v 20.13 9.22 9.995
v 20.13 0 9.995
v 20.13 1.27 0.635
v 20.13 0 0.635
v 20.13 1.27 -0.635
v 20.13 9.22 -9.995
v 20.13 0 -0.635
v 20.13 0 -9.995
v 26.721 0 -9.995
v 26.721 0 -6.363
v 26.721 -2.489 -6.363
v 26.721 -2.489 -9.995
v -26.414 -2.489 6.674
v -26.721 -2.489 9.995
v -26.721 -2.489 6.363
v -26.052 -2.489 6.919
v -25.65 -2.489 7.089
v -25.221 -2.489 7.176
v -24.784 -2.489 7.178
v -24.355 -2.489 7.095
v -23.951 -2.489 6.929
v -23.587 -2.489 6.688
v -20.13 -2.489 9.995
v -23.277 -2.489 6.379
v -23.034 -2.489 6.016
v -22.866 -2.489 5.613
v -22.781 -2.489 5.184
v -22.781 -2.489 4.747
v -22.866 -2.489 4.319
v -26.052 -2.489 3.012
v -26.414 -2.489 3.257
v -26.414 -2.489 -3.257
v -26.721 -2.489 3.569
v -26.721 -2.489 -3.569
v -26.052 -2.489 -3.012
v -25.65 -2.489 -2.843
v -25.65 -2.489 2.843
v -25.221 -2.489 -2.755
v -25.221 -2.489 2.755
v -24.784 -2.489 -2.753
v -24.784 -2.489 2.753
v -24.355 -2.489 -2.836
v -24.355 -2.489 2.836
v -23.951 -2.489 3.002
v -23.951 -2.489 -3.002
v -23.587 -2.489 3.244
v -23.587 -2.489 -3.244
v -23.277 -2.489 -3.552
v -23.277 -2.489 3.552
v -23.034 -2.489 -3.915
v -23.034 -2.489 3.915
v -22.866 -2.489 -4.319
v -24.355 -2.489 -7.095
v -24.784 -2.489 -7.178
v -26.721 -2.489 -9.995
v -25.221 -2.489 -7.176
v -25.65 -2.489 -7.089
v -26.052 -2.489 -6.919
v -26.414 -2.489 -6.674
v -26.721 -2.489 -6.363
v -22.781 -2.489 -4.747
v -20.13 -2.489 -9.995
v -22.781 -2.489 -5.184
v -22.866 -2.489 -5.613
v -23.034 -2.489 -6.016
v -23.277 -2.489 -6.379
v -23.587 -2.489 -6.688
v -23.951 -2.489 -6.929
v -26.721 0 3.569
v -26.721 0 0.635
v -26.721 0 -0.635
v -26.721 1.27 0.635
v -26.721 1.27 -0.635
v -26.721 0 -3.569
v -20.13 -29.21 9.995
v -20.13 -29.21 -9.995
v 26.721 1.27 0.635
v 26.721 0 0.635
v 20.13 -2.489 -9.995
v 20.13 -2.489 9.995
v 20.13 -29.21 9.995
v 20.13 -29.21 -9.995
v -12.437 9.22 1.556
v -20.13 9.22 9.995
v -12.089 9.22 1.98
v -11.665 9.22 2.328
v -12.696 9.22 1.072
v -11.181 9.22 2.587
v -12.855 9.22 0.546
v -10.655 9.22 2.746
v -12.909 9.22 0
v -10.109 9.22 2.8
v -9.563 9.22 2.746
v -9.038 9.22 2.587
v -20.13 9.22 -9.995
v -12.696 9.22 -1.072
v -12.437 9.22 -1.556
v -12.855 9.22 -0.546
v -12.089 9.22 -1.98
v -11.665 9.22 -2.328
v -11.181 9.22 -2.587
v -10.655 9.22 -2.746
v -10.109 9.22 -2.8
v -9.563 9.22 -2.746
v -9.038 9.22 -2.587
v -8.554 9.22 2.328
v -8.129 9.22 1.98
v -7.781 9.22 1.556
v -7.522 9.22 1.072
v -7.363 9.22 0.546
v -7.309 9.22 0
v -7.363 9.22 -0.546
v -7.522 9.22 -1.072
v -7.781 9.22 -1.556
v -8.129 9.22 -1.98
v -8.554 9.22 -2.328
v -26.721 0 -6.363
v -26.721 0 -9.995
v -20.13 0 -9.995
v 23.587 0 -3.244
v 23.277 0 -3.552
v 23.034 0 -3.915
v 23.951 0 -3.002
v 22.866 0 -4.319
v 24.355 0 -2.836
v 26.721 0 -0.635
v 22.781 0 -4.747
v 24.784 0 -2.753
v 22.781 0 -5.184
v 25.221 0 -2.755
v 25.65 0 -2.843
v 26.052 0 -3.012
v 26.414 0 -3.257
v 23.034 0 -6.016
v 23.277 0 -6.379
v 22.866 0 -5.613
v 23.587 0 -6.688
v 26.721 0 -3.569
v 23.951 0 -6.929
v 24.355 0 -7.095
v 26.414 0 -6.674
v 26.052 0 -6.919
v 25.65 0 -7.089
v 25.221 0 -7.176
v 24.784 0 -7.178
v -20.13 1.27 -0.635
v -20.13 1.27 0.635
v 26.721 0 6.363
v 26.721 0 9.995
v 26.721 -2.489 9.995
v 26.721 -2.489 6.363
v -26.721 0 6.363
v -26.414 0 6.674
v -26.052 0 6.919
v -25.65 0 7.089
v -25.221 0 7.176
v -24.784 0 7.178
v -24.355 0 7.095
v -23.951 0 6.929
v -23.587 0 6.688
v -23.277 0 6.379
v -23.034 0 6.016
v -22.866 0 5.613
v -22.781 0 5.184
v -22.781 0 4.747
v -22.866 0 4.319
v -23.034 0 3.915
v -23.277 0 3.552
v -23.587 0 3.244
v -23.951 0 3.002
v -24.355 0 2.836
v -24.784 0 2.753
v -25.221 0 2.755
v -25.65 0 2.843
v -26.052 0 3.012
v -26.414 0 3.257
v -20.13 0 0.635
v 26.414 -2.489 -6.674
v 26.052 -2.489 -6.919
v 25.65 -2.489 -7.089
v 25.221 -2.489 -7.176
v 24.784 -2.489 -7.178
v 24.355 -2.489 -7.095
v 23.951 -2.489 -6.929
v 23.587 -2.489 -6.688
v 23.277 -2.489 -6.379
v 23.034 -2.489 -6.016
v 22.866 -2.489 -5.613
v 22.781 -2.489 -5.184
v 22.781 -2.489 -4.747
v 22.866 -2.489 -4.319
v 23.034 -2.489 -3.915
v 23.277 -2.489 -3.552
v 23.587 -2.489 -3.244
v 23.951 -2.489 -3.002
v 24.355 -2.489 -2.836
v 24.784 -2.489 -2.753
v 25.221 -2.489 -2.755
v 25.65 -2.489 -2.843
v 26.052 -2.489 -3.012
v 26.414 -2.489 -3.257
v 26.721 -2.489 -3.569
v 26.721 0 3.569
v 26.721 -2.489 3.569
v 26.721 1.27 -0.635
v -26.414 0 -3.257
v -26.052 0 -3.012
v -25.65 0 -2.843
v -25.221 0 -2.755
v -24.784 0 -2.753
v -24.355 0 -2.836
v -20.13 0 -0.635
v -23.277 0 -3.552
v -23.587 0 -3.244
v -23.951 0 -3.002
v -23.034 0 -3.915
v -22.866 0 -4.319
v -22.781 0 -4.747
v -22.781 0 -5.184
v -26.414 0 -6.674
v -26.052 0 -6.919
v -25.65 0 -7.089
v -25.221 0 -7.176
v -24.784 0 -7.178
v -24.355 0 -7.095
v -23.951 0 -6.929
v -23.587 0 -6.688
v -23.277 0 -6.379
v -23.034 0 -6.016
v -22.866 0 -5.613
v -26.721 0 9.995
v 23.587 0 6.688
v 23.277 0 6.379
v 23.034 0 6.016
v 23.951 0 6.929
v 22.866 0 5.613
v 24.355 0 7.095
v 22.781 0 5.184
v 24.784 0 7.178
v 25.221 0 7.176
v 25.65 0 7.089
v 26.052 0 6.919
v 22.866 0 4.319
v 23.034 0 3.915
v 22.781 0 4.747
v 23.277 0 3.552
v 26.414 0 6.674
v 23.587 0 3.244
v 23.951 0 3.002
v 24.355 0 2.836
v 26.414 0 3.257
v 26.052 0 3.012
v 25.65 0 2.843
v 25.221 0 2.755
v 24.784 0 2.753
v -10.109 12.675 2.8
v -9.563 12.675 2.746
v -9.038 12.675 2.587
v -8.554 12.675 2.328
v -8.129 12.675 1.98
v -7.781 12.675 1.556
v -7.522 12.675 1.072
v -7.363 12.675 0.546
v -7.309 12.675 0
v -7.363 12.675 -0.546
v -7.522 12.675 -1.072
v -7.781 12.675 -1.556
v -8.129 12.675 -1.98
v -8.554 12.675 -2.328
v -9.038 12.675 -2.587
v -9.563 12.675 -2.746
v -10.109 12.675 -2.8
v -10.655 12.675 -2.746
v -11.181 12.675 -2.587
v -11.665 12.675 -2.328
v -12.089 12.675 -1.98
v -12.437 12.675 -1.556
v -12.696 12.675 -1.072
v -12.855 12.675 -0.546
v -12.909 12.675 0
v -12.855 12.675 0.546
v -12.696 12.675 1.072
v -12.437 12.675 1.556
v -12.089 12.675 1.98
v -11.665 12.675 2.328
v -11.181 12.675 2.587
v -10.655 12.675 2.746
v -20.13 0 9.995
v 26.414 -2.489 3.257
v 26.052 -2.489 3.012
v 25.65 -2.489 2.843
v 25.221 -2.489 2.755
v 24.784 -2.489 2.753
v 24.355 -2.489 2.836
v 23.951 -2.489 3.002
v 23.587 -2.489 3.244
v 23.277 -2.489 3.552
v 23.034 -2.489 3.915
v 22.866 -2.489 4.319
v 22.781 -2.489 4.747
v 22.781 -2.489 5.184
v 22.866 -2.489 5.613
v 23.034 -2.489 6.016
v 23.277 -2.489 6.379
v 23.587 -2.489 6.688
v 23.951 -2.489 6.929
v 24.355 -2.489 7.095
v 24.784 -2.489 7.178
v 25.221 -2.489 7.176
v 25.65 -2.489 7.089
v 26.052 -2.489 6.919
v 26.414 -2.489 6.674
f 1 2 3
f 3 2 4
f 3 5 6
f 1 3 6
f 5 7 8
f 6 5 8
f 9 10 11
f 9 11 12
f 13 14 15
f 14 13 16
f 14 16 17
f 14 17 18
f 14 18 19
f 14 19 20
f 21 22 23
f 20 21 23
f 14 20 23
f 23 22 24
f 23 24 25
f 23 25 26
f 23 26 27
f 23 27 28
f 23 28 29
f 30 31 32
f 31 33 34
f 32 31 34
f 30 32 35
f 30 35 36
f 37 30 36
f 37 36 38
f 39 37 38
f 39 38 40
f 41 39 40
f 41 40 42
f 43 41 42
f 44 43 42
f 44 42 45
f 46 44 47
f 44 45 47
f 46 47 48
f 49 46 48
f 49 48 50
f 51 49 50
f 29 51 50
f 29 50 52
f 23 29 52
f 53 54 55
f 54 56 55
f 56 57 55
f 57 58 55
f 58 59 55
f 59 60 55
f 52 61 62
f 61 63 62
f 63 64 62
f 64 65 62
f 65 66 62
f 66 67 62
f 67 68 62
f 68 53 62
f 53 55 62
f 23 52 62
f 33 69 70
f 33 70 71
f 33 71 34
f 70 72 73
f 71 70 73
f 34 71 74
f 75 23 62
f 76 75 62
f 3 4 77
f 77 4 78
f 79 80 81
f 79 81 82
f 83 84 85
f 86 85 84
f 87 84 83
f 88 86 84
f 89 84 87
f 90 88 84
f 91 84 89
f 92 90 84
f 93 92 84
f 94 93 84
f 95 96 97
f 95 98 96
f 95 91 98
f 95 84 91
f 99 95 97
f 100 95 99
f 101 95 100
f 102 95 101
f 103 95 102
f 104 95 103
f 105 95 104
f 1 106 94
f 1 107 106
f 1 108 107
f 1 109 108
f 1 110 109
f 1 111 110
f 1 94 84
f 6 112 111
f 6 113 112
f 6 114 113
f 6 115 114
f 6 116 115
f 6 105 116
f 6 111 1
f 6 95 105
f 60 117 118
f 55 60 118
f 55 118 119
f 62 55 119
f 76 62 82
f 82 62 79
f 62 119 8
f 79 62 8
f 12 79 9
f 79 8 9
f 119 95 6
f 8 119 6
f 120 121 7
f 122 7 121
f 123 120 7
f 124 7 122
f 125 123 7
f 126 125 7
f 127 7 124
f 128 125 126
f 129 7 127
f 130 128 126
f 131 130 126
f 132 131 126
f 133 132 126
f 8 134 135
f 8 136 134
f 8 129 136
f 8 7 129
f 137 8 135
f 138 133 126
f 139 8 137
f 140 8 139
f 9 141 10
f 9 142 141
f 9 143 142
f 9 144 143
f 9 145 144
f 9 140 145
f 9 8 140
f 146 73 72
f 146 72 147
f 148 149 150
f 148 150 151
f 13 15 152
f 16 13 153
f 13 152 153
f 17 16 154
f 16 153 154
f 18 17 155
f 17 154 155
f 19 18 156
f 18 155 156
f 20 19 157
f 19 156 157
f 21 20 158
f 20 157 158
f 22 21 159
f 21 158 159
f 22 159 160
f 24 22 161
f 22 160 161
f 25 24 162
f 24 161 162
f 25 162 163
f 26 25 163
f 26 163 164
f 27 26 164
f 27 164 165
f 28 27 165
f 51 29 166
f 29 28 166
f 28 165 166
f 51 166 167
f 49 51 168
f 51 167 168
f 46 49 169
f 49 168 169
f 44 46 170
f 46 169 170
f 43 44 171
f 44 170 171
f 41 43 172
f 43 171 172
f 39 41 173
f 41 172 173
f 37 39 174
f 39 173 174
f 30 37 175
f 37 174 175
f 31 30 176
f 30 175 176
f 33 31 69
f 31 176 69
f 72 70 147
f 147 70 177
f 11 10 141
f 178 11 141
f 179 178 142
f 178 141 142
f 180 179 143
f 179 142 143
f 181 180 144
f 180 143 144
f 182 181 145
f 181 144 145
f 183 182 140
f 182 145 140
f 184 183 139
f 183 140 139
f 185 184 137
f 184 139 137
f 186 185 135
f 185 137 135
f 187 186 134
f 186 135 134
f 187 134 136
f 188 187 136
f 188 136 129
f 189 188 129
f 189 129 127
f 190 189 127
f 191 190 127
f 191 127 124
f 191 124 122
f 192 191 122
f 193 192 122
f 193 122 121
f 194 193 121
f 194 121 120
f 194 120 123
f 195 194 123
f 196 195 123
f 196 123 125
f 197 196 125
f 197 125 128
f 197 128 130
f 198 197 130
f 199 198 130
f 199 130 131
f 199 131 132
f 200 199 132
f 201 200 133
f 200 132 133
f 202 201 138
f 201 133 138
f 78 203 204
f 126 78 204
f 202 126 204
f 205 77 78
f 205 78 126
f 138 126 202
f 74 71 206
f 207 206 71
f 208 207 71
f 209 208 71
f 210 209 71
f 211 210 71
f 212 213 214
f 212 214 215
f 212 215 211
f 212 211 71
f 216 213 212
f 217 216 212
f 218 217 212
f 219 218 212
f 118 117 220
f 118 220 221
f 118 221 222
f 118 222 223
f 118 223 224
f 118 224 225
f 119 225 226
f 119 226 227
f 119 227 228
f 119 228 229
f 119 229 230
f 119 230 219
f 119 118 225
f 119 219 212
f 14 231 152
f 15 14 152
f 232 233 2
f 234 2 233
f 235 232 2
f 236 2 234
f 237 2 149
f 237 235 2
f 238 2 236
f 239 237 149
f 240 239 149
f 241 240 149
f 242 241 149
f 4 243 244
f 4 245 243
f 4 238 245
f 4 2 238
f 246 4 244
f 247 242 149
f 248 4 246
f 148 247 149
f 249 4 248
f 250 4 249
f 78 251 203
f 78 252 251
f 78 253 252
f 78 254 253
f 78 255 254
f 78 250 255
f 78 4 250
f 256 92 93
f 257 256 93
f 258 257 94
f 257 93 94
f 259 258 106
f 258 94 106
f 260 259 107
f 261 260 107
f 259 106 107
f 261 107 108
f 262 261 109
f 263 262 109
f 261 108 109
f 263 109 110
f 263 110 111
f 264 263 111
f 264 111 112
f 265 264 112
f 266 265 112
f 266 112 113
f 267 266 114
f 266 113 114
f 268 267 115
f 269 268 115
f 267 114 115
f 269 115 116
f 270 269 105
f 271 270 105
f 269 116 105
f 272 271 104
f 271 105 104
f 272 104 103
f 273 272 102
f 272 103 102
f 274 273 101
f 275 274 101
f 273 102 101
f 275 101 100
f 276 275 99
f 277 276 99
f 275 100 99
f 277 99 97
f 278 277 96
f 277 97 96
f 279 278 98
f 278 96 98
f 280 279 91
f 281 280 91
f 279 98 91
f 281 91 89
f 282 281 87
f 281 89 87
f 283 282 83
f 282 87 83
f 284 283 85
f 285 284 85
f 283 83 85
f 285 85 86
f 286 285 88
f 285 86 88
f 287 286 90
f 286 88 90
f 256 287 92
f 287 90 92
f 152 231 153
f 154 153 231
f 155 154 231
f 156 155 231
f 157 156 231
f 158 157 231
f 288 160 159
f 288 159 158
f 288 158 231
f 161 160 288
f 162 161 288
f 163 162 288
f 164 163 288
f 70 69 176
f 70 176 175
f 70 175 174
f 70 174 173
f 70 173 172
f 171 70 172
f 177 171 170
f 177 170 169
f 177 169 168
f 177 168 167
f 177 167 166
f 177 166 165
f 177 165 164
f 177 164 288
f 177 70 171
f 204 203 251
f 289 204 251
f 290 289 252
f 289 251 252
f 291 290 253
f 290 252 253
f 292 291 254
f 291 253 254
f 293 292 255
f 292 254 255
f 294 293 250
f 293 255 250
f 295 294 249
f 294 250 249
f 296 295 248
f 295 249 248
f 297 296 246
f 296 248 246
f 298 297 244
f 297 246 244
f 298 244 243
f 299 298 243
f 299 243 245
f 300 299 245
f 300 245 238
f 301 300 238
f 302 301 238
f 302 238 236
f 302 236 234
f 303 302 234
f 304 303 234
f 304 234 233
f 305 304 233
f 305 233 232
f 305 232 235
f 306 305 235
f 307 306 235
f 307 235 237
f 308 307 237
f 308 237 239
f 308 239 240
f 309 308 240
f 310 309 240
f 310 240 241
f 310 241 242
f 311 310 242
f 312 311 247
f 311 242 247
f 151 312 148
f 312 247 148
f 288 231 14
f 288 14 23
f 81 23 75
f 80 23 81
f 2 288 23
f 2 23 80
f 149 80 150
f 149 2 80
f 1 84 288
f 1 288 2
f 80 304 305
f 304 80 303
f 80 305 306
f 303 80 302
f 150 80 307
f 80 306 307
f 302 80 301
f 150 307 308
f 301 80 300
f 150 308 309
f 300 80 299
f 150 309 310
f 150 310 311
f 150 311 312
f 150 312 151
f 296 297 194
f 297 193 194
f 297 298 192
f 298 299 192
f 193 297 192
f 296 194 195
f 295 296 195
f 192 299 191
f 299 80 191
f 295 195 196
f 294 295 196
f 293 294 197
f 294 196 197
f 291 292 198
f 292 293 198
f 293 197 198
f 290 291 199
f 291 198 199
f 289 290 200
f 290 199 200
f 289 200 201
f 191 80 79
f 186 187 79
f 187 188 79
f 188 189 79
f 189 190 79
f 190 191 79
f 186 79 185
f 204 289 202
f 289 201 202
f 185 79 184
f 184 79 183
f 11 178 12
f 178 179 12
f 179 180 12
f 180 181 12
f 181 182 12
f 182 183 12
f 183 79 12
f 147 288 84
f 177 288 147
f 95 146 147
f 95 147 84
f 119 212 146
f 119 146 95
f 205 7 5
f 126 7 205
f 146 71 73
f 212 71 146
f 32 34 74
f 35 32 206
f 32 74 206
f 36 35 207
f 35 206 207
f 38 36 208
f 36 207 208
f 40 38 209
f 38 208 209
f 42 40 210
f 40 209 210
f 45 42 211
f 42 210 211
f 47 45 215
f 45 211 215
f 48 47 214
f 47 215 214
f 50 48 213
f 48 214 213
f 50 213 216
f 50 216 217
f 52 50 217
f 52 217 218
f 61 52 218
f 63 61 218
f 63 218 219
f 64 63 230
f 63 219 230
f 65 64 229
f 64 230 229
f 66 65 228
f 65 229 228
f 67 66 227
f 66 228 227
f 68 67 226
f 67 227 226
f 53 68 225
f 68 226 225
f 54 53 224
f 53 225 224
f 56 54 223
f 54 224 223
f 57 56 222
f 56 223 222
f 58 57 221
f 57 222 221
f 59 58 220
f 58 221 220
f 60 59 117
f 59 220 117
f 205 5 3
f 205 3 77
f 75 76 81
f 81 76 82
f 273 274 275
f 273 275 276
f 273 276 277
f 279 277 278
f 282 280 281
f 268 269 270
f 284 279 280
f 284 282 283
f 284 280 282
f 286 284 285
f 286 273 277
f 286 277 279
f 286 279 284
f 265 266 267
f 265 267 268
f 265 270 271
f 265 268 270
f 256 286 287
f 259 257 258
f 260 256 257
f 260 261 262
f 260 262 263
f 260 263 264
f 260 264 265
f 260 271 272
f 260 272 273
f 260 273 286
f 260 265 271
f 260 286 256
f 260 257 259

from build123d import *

# Parameters (mm, degrees)
SKETCH2_W               = 40.259
SKETCH2_H               = 19.9898
TOP_OF_HOUSING_DEPTH    = 9.2202
OUTER_EDGE_OF_MOTOR_W   = 53.4416
OUTER_EDGE_OF_MOTOR_H   = 19.9898
MOUNTING_FIN_DEPTH      = 2.4892
SKETCH4_R               = 2.2225
MOUNTING_HOLES_DEPTH    = 30.981848954
SKETCH5_R               = 2.799999988
C24T_SPLINE_DEPTH       = 3.4544
SKETCH2_2_W             = 40.259
SKETCH2_2_H             = 19.9898
BOTTOM_OF_HOUSING_DEPTH = 29.21
SKETCH6_W               = 6.5913
SKETCH6_H               = 1.27
NUB_DEPTH               = 1.27


with BuildPart() as part:
    # Sketch2 → Top of Housing (new body)
    with BuildSketch(Plane(origin=(0, 0, 0), x_dir=(1, 0, 0), z_dir=(0, 1, 0))):
        Rectangle(SKETCH2_W, SKETCH2_H)
    extrude(amount=TOP_OF_HOUSING_DEPTH)

    # Outer Edge of Motor → Mounting Fin (add)
    with BuildSketch(Plane(origin=(0, 0, 0), x_dir=(1, 0, 0), z_dir=(0, 1, 0))):
        Rectangle(OUTER_EDGE_OF_MOTOR_W, OUTER_EDGE_OF_MOTOR_H)
    extrude(amount=-MOUNTING_FIN_DEPTH)

    # Sketch4 → Mounting Holes (cut, through all)
    with BuildSketch(Plane(origin=(0, 0, 0), x_dir=(1, 0, 0), z_dir=(0, 1, 0))):
        with Locations((-24.992246486, 4.9657)):
            Circle(SKETCH4_R)
        with Locations((-24.992246486, -4.9657)):
            Circle(SKETCH4_R)
        with Locations((24.992246486, -4.9657)):
            Circle(SKETCH4_R)
        with Locations((24.992246486, 4.9657)):
            Circle(SKETCH4_R)
    extrude(amount=-MOUNTING_HOLES_DEPTH, mode=Mode.SUBTRACT)

    # Sketch5 → C24T Spline (add)
    with BuildSketch(Plane(origin=(0, 9.2202, 0), x_dir=(1, 0, 0), z_dir=(0, 1, 0))):
        with Locations((-10.1092, 0)):
            Circle(SKETCH5_R)
    extrude(amount=C24T_SPLINE_DEPTH)

    # Sketch2<2> → Bottom of Housing (add)
    with BuildSketch(Plane(origin=(0, 0, 0), x_dir=(1, 0, 0), z_dir=(0, 1, 0))):
        Rectangle(SKETCH2_2_W, SKETCH2_2_H)
    extrude(amount=-BOTTOM_OF_HOUSING_DEPTH)

    # Sketch6 → Nub (add)
    with BuildSketch(Plane(origin=(0, 0, 0), x_dir=(1, 0, 0), z_dir=(0, 1, 0))):
        with Locations((23.42515, 0)):
            Rectangle(SKETCH6_W, SKETCH6_H)
        with Locations((-23.42515, 0)):
            Rectangle(SKETCH6_W, SKETCH6_H)
    extrude(amount=NUB_DEPTH)


solid = part.part
